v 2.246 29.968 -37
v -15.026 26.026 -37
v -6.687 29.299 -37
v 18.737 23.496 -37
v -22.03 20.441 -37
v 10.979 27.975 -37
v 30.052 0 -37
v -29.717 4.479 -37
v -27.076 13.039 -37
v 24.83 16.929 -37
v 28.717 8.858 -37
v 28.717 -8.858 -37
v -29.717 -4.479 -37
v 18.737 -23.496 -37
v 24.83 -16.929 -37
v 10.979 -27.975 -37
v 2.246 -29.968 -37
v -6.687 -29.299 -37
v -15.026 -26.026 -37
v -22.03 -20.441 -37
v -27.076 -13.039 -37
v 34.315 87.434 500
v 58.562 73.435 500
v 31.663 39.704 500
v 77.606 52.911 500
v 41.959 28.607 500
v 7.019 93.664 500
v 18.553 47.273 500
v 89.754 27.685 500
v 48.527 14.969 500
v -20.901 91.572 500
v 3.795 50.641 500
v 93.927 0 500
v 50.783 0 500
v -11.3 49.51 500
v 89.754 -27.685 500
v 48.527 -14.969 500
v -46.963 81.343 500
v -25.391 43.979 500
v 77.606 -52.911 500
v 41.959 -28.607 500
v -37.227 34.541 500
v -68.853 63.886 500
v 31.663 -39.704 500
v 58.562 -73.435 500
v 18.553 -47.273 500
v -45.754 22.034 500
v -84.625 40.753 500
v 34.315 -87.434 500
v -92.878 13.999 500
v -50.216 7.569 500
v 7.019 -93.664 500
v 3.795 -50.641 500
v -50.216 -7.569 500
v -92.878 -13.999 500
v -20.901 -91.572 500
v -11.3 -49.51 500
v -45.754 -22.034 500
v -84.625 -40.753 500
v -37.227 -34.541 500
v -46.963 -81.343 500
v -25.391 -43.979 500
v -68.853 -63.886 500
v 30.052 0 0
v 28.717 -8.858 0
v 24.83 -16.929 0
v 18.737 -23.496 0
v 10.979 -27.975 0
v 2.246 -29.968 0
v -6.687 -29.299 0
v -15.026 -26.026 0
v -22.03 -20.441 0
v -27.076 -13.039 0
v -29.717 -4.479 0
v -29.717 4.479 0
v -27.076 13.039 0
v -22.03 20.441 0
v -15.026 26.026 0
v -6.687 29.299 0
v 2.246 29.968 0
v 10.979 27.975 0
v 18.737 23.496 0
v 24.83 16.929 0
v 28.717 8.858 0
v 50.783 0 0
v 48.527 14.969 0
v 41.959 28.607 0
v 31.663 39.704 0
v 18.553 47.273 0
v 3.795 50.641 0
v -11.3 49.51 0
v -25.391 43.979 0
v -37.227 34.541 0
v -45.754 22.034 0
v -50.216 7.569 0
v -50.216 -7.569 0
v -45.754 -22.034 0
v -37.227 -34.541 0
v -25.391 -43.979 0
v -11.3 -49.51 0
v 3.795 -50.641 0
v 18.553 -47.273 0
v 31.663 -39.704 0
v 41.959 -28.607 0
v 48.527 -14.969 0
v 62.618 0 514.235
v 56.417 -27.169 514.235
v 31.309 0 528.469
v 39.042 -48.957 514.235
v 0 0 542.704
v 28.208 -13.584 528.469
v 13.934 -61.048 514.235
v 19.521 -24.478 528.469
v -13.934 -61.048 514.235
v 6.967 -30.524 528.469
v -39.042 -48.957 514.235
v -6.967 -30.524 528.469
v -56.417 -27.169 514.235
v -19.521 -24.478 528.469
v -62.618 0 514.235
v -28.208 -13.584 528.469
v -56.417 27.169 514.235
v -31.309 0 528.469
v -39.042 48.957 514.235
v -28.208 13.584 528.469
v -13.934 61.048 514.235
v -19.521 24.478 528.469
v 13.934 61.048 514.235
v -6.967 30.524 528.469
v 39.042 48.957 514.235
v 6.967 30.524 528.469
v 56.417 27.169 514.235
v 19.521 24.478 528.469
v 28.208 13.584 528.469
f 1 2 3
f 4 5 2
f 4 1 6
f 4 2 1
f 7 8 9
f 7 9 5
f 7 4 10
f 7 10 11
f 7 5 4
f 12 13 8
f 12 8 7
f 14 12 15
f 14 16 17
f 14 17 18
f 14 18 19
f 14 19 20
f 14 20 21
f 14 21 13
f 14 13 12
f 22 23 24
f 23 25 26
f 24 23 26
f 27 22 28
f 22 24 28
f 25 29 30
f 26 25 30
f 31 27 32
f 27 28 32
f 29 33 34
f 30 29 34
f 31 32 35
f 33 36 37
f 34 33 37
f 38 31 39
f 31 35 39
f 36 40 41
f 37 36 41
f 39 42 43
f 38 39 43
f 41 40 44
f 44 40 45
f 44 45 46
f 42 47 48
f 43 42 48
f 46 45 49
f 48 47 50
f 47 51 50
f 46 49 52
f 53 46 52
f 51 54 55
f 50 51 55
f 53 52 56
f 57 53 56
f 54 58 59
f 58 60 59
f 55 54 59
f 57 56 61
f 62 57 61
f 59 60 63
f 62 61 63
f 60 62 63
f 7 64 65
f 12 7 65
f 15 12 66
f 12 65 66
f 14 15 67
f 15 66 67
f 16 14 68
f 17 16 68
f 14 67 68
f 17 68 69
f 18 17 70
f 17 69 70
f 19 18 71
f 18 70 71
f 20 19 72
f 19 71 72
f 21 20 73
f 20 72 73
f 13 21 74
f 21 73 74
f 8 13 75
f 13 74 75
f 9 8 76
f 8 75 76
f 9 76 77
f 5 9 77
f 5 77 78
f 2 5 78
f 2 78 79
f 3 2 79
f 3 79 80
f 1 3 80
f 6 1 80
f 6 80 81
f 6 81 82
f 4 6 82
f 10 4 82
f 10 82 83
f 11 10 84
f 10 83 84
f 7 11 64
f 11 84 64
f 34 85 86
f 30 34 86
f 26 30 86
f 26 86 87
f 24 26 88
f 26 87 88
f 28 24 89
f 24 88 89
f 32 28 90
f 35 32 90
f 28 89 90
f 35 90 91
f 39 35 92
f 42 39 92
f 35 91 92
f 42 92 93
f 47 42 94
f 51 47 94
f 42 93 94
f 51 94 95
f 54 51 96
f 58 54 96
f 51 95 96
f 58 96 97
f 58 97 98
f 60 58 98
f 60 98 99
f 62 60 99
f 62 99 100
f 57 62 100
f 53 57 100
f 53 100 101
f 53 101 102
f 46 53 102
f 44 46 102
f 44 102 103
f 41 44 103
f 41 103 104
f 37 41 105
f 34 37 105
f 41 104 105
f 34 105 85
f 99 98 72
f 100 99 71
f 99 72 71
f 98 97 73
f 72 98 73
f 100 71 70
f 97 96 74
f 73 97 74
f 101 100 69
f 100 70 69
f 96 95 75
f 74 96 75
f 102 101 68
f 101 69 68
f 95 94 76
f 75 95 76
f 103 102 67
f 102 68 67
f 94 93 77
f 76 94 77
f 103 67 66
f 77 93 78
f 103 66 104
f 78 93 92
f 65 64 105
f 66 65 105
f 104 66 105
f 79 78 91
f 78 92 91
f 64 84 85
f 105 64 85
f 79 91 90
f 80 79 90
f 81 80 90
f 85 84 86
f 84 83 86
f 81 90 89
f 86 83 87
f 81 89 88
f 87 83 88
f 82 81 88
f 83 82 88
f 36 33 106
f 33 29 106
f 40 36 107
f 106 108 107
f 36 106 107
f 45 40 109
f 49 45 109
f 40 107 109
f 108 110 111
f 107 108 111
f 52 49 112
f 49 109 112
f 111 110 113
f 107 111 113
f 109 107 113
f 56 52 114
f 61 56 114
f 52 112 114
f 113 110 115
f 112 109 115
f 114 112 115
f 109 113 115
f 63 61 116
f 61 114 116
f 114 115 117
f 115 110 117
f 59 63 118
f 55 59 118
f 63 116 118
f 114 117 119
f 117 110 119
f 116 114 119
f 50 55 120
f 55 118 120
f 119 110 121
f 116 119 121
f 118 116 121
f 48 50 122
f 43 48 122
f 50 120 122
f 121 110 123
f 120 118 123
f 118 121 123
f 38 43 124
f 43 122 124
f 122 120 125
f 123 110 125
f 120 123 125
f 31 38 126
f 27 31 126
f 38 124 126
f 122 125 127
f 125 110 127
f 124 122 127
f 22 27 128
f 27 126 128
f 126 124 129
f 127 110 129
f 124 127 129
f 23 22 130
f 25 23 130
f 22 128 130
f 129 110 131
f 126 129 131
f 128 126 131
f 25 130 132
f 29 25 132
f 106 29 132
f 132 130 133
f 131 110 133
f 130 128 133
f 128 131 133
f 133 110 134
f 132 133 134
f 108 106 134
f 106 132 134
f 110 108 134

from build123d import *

# Parameters (mm, degrees)
F0_R     = 50.782965
F1_DEPTH = 500
F4_R     = 30.052271
F5_DEPTH = 37


with BuildPart() as f1:
    # F0 (on Top) → F1 (new body)
    with BuildSketch(Plane.XY):
        Circle(F0_R)
    extrude(amount=F1_DEPTH)

    # F2 (on Front) → F3 (revolve)
    with BuildSketch(Plane.XZ):
        Polygon((93.926854, 500), (0, 542.704165), (0, 500), align=None)
    revolve(axis=Axis((0, 0, 521.352082), (0, 0, -1)))

    # F4 (on face) → F5 (join)
    with BuildSketch(Plane(origin=(0, 0, 0), x_dir=(1, 0, 0), z_dir=(0, 0, -1))):
        Circle(F4_R)
    extrude(amount=F5_DEPTH)


solid = f1.part
